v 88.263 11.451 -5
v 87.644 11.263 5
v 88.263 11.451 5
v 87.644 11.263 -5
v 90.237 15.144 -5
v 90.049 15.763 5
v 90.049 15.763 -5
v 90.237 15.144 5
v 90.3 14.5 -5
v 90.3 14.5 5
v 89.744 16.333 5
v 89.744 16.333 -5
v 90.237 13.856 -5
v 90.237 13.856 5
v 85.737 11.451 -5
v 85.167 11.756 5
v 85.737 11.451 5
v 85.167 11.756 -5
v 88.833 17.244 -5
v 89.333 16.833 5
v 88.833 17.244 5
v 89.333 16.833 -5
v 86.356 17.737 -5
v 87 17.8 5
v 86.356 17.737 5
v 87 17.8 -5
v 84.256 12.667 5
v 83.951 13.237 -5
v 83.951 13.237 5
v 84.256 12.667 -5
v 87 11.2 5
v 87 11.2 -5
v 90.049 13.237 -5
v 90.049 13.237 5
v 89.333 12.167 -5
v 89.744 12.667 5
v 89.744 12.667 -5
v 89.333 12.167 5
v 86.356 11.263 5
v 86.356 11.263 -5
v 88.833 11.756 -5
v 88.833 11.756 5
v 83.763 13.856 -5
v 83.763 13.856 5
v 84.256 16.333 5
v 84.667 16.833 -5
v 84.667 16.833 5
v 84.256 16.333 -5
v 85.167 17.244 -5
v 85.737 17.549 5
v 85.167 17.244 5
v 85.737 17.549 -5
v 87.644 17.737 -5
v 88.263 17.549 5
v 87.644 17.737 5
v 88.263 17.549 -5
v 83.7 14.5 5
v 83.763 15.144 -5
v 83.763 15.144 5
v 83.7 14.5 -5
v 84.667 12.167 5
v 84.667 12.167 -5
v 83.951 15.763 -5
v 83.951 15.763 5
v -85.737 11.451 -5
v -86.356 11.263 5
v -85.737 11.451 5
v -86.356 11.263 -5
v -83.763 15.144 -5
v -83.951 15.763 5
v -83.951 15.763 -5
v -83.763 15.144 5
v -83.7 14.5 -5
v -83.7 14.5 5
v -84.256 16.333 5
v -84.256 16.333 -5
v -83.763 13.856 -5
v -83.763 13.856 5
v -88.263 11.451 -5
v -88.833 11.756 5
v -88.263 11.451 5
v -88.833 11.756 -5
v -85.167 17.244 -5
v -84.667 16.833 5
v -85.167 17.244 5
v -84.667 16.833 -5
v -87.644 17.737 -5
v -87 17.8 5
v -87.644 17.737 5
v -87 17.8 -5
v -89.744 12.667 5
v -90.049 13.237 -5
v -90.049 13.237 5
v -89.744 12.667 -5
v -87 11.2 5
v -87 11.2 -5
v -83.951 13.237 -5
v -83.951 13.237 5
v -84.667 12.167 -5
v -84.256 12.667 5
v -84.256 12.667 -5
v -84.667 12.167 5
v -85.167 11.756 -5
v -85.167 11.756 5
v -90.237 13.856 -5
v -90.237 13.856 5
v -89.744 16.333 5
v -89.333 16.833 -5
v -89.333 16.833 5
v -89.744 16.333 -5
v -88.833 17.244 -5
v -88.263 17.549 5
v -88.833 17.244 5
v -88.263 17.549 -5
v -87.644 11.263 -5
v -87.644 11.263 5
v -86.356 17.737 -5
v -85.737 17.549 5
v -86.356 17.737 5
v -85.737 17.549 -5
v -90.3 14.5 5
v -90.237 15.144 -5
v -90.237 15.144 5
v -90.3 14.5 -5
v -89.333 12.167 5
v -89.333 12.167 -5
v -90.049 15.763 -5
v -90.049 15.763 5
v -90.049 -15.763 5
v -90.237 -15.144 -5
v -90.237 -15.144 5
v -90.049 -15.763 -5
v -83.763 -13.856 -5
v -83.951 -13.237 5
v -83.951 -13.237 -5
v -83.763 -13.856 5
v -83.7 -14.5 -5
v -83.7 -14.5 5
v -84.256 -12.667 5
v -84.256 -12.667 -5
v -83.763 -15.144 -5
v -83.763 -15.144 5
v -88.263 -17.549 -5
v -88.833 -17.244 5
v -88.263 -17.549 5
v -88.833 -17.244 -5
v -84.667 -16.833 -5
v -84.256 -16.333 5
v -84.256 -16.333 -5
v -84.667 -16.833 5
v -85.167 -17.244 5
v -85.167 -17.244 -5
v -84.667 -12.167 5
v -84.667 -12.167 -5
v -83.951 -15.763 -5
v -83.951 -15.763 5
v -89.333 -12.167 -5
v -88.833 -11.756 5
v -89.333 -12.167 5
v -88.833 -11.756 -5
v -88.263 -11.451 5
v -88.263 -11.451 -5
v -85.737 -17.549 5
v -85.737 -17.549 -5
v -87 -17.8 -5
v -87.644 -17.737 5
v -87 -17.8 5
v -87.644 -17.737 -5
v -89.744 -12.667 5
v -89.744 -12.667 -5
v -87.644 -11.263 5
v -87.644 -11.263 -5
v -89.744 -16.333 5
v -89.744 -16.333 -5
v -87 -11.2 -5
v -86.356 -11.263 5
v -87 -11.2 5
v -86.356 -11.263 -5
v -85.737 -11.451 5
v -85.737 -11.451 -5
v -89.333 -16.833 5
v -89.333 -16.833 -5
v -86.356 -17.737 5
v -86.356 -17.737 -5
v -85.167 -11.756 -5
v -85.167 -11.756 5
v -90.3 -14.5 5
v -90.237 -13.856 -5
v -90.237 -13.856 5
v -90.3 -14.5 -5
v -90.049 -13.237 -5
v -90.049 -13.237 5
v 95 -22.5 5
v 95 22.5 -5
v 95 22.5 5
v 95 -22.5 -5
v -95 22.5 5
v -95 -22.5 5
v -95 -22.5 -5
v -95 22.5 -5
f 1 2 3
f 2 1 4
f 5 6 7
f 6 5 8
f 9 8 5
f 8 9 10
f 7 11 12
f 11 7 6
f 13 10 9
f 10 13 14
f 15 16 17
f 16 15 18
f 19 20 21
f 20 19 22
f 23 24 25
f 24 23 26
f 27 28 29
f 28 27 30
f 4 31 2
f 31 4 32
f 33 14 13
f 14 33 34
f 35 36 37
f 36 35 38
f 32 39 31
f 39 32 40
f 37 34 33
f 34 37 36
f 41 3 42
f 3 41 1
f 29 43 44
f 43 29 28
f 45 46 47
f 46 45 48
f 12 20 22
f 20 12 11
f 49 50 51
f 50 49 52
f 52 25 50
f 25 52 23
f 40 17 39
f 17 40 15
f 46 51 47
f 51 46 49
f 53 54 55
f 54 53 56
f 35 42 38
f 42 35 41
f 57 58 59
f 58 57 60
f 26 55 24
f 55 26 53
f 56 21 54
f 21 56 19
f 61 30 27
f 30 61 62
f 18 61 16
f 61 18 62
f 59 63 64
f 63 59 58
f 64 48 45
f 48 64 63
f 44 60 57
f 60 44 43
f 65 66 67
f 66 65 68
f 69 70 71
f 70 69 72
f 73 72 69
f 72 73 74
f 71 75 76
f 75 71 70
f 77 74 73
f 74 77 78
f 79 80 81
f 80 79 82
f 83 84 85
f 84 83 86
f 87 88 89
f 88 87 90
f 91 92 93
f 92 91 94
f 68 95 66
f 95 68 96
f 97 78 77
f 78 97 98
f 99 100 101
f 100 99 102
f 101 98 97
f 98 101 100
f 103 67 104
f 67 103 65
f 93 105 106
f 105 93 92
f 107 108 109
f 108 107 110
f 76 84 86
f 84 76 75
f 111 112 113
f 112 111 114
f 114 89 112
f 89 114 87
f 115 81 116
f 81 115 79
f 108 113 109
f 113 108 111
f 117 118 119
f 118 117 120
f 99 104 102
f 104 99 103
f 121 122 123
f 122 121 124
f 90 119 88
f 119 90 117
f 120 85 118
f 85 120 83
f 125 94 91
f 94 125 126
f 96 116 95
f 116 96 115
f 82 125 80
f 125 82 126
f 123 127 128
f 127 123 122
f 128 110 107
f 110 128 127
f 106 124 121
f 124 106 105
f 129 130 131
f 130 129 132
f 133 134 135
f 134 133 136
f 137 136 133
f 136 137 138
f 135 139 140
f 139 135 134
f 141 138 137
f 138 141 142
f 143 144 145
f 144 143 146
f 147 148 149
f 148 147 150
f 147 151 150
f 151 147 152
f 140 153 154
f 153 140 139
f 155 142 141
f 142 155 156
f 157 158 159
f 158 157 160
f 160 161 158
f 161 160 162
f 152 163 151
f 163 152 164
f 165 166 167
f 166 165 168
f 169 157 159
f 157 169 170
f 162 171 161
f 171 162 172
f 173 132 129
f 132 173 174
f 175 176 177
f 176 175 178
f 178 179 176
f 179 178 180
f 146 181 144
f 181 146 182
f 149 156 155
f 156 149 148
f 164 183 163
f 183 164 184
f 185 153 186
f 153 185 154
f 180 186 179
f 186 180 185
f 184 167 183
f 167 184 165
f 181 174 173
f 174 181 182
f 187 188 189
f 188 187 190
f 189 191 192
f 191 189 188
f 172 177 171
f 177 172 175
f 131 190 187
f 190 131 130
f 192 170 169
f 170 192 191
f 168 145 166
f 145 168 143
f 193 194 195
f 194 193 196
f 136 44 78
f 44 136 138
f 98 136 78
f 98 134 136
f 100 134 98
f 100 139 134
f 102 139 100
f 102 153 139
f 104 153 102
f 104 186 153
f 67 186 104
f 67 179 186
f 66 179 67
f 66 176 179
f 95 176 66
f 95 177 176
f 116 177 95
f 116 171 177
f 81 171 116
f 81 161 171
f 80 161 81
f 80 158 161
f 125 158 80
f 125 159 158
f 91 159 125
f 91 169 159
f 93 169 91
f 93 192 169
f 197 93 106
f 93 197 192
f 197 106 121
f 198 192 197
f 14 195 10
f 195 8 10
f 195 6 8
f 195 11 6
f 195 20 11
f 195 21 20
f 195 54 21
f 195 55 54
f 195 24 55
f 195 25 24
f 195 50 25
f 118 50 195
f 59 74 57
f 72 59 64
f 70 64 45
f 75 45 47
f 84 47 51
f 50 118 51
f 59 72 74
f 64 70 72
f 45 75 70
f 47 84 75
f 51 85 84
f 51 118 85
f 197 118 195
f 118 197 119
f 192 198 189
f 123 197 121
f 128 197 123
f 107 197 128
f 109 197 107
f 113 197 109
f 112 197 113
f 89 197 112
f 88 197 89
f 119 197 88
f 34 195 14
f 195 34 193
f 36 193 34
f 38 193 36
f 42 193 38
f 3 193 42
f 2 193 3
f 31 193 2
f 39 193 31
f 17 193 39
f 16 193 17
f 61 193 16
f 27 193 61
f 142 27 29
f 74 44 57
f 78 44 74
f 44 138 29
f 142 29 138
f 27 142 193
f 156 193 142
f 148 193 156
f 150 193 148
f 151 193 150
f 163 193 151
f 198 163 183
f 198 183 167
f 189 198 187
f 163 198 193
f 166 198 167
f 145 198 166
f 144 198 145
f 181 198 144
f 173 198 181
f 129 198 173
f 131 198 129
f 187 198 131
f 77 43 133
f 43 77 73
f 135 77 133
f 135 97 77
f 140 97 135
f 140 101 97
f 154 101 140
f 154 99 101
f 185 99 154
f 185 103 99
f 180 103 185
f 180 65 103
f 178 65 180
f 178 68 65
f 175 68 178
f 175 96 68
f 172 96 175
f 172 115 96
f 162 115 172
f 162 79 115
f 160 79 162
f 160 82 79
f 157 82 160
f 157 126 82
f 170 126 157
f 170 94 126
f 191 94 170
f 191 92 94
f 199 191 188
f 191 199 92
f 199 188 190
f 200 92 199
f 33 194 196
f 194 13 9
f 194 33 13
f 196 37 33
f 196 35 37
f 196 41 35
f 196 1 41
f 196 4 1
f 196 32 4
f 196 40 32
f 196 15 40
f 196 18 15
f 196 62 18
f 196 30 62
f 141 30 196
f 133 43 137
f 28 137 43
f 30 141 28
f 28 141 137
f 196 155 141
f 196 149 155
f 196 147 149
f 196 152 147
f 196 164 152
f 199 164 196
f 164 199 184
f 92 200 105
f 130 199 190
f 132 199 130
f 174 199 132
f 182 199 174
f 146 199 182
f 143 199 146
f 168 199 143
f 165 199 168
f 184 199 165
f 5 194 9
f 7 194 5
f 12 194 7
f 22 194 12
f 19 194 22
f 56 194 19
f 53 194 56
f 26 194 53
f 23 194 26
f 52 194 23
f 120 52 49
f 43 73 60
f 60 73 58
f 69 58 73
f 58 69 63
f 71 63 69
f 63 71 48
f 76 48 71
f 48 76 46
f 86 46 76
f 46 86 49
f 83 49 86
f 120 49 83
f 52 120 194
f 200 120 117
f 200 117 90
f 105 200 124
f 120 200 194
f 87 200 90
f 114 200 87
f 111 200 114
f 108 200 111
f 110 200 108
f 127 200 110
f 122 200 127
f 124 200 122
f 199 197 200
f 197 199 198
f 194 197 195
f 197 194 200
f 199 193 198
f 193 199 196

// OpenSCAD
$fn = 32;

// ----------------------------------------------------------------------
// Corner plate 190 x 45 x 10
// 3 holes, centres taken from the edge offset
// ----------------------------------------------------------------------

// --- parameters (mm) ---
plate = [190, 45, 10];  // overall size (x, y, z)
holes = 3;              // number of holes the drawing asks for
hole_d = 6.6;           // hole diameter
edge = 8;               // hole centre offset from the plate edge

// --- derived feature positions (mm) ---
corner_x = plate[0] / 2 - edge;  // = 87   corner hole X
corner_y = plate[1] / 2 - edge;  // = 14.5   corner hole Y
feature_centers = [
  [corner_x, corner_y],
  [-corner_x, corner_y],
  [-corner_x, -corner_y]
];   // hole centres the loop below drills

// plate outline, every hole drilled through with the same cutters
difference() {
  cube(plate, center = true);
  for (centre = feature_centers)
    translate([centre[0], centre[1], 0])
      cylinder(d = hole_d, h = plate[2] + 2, center = true);
}
